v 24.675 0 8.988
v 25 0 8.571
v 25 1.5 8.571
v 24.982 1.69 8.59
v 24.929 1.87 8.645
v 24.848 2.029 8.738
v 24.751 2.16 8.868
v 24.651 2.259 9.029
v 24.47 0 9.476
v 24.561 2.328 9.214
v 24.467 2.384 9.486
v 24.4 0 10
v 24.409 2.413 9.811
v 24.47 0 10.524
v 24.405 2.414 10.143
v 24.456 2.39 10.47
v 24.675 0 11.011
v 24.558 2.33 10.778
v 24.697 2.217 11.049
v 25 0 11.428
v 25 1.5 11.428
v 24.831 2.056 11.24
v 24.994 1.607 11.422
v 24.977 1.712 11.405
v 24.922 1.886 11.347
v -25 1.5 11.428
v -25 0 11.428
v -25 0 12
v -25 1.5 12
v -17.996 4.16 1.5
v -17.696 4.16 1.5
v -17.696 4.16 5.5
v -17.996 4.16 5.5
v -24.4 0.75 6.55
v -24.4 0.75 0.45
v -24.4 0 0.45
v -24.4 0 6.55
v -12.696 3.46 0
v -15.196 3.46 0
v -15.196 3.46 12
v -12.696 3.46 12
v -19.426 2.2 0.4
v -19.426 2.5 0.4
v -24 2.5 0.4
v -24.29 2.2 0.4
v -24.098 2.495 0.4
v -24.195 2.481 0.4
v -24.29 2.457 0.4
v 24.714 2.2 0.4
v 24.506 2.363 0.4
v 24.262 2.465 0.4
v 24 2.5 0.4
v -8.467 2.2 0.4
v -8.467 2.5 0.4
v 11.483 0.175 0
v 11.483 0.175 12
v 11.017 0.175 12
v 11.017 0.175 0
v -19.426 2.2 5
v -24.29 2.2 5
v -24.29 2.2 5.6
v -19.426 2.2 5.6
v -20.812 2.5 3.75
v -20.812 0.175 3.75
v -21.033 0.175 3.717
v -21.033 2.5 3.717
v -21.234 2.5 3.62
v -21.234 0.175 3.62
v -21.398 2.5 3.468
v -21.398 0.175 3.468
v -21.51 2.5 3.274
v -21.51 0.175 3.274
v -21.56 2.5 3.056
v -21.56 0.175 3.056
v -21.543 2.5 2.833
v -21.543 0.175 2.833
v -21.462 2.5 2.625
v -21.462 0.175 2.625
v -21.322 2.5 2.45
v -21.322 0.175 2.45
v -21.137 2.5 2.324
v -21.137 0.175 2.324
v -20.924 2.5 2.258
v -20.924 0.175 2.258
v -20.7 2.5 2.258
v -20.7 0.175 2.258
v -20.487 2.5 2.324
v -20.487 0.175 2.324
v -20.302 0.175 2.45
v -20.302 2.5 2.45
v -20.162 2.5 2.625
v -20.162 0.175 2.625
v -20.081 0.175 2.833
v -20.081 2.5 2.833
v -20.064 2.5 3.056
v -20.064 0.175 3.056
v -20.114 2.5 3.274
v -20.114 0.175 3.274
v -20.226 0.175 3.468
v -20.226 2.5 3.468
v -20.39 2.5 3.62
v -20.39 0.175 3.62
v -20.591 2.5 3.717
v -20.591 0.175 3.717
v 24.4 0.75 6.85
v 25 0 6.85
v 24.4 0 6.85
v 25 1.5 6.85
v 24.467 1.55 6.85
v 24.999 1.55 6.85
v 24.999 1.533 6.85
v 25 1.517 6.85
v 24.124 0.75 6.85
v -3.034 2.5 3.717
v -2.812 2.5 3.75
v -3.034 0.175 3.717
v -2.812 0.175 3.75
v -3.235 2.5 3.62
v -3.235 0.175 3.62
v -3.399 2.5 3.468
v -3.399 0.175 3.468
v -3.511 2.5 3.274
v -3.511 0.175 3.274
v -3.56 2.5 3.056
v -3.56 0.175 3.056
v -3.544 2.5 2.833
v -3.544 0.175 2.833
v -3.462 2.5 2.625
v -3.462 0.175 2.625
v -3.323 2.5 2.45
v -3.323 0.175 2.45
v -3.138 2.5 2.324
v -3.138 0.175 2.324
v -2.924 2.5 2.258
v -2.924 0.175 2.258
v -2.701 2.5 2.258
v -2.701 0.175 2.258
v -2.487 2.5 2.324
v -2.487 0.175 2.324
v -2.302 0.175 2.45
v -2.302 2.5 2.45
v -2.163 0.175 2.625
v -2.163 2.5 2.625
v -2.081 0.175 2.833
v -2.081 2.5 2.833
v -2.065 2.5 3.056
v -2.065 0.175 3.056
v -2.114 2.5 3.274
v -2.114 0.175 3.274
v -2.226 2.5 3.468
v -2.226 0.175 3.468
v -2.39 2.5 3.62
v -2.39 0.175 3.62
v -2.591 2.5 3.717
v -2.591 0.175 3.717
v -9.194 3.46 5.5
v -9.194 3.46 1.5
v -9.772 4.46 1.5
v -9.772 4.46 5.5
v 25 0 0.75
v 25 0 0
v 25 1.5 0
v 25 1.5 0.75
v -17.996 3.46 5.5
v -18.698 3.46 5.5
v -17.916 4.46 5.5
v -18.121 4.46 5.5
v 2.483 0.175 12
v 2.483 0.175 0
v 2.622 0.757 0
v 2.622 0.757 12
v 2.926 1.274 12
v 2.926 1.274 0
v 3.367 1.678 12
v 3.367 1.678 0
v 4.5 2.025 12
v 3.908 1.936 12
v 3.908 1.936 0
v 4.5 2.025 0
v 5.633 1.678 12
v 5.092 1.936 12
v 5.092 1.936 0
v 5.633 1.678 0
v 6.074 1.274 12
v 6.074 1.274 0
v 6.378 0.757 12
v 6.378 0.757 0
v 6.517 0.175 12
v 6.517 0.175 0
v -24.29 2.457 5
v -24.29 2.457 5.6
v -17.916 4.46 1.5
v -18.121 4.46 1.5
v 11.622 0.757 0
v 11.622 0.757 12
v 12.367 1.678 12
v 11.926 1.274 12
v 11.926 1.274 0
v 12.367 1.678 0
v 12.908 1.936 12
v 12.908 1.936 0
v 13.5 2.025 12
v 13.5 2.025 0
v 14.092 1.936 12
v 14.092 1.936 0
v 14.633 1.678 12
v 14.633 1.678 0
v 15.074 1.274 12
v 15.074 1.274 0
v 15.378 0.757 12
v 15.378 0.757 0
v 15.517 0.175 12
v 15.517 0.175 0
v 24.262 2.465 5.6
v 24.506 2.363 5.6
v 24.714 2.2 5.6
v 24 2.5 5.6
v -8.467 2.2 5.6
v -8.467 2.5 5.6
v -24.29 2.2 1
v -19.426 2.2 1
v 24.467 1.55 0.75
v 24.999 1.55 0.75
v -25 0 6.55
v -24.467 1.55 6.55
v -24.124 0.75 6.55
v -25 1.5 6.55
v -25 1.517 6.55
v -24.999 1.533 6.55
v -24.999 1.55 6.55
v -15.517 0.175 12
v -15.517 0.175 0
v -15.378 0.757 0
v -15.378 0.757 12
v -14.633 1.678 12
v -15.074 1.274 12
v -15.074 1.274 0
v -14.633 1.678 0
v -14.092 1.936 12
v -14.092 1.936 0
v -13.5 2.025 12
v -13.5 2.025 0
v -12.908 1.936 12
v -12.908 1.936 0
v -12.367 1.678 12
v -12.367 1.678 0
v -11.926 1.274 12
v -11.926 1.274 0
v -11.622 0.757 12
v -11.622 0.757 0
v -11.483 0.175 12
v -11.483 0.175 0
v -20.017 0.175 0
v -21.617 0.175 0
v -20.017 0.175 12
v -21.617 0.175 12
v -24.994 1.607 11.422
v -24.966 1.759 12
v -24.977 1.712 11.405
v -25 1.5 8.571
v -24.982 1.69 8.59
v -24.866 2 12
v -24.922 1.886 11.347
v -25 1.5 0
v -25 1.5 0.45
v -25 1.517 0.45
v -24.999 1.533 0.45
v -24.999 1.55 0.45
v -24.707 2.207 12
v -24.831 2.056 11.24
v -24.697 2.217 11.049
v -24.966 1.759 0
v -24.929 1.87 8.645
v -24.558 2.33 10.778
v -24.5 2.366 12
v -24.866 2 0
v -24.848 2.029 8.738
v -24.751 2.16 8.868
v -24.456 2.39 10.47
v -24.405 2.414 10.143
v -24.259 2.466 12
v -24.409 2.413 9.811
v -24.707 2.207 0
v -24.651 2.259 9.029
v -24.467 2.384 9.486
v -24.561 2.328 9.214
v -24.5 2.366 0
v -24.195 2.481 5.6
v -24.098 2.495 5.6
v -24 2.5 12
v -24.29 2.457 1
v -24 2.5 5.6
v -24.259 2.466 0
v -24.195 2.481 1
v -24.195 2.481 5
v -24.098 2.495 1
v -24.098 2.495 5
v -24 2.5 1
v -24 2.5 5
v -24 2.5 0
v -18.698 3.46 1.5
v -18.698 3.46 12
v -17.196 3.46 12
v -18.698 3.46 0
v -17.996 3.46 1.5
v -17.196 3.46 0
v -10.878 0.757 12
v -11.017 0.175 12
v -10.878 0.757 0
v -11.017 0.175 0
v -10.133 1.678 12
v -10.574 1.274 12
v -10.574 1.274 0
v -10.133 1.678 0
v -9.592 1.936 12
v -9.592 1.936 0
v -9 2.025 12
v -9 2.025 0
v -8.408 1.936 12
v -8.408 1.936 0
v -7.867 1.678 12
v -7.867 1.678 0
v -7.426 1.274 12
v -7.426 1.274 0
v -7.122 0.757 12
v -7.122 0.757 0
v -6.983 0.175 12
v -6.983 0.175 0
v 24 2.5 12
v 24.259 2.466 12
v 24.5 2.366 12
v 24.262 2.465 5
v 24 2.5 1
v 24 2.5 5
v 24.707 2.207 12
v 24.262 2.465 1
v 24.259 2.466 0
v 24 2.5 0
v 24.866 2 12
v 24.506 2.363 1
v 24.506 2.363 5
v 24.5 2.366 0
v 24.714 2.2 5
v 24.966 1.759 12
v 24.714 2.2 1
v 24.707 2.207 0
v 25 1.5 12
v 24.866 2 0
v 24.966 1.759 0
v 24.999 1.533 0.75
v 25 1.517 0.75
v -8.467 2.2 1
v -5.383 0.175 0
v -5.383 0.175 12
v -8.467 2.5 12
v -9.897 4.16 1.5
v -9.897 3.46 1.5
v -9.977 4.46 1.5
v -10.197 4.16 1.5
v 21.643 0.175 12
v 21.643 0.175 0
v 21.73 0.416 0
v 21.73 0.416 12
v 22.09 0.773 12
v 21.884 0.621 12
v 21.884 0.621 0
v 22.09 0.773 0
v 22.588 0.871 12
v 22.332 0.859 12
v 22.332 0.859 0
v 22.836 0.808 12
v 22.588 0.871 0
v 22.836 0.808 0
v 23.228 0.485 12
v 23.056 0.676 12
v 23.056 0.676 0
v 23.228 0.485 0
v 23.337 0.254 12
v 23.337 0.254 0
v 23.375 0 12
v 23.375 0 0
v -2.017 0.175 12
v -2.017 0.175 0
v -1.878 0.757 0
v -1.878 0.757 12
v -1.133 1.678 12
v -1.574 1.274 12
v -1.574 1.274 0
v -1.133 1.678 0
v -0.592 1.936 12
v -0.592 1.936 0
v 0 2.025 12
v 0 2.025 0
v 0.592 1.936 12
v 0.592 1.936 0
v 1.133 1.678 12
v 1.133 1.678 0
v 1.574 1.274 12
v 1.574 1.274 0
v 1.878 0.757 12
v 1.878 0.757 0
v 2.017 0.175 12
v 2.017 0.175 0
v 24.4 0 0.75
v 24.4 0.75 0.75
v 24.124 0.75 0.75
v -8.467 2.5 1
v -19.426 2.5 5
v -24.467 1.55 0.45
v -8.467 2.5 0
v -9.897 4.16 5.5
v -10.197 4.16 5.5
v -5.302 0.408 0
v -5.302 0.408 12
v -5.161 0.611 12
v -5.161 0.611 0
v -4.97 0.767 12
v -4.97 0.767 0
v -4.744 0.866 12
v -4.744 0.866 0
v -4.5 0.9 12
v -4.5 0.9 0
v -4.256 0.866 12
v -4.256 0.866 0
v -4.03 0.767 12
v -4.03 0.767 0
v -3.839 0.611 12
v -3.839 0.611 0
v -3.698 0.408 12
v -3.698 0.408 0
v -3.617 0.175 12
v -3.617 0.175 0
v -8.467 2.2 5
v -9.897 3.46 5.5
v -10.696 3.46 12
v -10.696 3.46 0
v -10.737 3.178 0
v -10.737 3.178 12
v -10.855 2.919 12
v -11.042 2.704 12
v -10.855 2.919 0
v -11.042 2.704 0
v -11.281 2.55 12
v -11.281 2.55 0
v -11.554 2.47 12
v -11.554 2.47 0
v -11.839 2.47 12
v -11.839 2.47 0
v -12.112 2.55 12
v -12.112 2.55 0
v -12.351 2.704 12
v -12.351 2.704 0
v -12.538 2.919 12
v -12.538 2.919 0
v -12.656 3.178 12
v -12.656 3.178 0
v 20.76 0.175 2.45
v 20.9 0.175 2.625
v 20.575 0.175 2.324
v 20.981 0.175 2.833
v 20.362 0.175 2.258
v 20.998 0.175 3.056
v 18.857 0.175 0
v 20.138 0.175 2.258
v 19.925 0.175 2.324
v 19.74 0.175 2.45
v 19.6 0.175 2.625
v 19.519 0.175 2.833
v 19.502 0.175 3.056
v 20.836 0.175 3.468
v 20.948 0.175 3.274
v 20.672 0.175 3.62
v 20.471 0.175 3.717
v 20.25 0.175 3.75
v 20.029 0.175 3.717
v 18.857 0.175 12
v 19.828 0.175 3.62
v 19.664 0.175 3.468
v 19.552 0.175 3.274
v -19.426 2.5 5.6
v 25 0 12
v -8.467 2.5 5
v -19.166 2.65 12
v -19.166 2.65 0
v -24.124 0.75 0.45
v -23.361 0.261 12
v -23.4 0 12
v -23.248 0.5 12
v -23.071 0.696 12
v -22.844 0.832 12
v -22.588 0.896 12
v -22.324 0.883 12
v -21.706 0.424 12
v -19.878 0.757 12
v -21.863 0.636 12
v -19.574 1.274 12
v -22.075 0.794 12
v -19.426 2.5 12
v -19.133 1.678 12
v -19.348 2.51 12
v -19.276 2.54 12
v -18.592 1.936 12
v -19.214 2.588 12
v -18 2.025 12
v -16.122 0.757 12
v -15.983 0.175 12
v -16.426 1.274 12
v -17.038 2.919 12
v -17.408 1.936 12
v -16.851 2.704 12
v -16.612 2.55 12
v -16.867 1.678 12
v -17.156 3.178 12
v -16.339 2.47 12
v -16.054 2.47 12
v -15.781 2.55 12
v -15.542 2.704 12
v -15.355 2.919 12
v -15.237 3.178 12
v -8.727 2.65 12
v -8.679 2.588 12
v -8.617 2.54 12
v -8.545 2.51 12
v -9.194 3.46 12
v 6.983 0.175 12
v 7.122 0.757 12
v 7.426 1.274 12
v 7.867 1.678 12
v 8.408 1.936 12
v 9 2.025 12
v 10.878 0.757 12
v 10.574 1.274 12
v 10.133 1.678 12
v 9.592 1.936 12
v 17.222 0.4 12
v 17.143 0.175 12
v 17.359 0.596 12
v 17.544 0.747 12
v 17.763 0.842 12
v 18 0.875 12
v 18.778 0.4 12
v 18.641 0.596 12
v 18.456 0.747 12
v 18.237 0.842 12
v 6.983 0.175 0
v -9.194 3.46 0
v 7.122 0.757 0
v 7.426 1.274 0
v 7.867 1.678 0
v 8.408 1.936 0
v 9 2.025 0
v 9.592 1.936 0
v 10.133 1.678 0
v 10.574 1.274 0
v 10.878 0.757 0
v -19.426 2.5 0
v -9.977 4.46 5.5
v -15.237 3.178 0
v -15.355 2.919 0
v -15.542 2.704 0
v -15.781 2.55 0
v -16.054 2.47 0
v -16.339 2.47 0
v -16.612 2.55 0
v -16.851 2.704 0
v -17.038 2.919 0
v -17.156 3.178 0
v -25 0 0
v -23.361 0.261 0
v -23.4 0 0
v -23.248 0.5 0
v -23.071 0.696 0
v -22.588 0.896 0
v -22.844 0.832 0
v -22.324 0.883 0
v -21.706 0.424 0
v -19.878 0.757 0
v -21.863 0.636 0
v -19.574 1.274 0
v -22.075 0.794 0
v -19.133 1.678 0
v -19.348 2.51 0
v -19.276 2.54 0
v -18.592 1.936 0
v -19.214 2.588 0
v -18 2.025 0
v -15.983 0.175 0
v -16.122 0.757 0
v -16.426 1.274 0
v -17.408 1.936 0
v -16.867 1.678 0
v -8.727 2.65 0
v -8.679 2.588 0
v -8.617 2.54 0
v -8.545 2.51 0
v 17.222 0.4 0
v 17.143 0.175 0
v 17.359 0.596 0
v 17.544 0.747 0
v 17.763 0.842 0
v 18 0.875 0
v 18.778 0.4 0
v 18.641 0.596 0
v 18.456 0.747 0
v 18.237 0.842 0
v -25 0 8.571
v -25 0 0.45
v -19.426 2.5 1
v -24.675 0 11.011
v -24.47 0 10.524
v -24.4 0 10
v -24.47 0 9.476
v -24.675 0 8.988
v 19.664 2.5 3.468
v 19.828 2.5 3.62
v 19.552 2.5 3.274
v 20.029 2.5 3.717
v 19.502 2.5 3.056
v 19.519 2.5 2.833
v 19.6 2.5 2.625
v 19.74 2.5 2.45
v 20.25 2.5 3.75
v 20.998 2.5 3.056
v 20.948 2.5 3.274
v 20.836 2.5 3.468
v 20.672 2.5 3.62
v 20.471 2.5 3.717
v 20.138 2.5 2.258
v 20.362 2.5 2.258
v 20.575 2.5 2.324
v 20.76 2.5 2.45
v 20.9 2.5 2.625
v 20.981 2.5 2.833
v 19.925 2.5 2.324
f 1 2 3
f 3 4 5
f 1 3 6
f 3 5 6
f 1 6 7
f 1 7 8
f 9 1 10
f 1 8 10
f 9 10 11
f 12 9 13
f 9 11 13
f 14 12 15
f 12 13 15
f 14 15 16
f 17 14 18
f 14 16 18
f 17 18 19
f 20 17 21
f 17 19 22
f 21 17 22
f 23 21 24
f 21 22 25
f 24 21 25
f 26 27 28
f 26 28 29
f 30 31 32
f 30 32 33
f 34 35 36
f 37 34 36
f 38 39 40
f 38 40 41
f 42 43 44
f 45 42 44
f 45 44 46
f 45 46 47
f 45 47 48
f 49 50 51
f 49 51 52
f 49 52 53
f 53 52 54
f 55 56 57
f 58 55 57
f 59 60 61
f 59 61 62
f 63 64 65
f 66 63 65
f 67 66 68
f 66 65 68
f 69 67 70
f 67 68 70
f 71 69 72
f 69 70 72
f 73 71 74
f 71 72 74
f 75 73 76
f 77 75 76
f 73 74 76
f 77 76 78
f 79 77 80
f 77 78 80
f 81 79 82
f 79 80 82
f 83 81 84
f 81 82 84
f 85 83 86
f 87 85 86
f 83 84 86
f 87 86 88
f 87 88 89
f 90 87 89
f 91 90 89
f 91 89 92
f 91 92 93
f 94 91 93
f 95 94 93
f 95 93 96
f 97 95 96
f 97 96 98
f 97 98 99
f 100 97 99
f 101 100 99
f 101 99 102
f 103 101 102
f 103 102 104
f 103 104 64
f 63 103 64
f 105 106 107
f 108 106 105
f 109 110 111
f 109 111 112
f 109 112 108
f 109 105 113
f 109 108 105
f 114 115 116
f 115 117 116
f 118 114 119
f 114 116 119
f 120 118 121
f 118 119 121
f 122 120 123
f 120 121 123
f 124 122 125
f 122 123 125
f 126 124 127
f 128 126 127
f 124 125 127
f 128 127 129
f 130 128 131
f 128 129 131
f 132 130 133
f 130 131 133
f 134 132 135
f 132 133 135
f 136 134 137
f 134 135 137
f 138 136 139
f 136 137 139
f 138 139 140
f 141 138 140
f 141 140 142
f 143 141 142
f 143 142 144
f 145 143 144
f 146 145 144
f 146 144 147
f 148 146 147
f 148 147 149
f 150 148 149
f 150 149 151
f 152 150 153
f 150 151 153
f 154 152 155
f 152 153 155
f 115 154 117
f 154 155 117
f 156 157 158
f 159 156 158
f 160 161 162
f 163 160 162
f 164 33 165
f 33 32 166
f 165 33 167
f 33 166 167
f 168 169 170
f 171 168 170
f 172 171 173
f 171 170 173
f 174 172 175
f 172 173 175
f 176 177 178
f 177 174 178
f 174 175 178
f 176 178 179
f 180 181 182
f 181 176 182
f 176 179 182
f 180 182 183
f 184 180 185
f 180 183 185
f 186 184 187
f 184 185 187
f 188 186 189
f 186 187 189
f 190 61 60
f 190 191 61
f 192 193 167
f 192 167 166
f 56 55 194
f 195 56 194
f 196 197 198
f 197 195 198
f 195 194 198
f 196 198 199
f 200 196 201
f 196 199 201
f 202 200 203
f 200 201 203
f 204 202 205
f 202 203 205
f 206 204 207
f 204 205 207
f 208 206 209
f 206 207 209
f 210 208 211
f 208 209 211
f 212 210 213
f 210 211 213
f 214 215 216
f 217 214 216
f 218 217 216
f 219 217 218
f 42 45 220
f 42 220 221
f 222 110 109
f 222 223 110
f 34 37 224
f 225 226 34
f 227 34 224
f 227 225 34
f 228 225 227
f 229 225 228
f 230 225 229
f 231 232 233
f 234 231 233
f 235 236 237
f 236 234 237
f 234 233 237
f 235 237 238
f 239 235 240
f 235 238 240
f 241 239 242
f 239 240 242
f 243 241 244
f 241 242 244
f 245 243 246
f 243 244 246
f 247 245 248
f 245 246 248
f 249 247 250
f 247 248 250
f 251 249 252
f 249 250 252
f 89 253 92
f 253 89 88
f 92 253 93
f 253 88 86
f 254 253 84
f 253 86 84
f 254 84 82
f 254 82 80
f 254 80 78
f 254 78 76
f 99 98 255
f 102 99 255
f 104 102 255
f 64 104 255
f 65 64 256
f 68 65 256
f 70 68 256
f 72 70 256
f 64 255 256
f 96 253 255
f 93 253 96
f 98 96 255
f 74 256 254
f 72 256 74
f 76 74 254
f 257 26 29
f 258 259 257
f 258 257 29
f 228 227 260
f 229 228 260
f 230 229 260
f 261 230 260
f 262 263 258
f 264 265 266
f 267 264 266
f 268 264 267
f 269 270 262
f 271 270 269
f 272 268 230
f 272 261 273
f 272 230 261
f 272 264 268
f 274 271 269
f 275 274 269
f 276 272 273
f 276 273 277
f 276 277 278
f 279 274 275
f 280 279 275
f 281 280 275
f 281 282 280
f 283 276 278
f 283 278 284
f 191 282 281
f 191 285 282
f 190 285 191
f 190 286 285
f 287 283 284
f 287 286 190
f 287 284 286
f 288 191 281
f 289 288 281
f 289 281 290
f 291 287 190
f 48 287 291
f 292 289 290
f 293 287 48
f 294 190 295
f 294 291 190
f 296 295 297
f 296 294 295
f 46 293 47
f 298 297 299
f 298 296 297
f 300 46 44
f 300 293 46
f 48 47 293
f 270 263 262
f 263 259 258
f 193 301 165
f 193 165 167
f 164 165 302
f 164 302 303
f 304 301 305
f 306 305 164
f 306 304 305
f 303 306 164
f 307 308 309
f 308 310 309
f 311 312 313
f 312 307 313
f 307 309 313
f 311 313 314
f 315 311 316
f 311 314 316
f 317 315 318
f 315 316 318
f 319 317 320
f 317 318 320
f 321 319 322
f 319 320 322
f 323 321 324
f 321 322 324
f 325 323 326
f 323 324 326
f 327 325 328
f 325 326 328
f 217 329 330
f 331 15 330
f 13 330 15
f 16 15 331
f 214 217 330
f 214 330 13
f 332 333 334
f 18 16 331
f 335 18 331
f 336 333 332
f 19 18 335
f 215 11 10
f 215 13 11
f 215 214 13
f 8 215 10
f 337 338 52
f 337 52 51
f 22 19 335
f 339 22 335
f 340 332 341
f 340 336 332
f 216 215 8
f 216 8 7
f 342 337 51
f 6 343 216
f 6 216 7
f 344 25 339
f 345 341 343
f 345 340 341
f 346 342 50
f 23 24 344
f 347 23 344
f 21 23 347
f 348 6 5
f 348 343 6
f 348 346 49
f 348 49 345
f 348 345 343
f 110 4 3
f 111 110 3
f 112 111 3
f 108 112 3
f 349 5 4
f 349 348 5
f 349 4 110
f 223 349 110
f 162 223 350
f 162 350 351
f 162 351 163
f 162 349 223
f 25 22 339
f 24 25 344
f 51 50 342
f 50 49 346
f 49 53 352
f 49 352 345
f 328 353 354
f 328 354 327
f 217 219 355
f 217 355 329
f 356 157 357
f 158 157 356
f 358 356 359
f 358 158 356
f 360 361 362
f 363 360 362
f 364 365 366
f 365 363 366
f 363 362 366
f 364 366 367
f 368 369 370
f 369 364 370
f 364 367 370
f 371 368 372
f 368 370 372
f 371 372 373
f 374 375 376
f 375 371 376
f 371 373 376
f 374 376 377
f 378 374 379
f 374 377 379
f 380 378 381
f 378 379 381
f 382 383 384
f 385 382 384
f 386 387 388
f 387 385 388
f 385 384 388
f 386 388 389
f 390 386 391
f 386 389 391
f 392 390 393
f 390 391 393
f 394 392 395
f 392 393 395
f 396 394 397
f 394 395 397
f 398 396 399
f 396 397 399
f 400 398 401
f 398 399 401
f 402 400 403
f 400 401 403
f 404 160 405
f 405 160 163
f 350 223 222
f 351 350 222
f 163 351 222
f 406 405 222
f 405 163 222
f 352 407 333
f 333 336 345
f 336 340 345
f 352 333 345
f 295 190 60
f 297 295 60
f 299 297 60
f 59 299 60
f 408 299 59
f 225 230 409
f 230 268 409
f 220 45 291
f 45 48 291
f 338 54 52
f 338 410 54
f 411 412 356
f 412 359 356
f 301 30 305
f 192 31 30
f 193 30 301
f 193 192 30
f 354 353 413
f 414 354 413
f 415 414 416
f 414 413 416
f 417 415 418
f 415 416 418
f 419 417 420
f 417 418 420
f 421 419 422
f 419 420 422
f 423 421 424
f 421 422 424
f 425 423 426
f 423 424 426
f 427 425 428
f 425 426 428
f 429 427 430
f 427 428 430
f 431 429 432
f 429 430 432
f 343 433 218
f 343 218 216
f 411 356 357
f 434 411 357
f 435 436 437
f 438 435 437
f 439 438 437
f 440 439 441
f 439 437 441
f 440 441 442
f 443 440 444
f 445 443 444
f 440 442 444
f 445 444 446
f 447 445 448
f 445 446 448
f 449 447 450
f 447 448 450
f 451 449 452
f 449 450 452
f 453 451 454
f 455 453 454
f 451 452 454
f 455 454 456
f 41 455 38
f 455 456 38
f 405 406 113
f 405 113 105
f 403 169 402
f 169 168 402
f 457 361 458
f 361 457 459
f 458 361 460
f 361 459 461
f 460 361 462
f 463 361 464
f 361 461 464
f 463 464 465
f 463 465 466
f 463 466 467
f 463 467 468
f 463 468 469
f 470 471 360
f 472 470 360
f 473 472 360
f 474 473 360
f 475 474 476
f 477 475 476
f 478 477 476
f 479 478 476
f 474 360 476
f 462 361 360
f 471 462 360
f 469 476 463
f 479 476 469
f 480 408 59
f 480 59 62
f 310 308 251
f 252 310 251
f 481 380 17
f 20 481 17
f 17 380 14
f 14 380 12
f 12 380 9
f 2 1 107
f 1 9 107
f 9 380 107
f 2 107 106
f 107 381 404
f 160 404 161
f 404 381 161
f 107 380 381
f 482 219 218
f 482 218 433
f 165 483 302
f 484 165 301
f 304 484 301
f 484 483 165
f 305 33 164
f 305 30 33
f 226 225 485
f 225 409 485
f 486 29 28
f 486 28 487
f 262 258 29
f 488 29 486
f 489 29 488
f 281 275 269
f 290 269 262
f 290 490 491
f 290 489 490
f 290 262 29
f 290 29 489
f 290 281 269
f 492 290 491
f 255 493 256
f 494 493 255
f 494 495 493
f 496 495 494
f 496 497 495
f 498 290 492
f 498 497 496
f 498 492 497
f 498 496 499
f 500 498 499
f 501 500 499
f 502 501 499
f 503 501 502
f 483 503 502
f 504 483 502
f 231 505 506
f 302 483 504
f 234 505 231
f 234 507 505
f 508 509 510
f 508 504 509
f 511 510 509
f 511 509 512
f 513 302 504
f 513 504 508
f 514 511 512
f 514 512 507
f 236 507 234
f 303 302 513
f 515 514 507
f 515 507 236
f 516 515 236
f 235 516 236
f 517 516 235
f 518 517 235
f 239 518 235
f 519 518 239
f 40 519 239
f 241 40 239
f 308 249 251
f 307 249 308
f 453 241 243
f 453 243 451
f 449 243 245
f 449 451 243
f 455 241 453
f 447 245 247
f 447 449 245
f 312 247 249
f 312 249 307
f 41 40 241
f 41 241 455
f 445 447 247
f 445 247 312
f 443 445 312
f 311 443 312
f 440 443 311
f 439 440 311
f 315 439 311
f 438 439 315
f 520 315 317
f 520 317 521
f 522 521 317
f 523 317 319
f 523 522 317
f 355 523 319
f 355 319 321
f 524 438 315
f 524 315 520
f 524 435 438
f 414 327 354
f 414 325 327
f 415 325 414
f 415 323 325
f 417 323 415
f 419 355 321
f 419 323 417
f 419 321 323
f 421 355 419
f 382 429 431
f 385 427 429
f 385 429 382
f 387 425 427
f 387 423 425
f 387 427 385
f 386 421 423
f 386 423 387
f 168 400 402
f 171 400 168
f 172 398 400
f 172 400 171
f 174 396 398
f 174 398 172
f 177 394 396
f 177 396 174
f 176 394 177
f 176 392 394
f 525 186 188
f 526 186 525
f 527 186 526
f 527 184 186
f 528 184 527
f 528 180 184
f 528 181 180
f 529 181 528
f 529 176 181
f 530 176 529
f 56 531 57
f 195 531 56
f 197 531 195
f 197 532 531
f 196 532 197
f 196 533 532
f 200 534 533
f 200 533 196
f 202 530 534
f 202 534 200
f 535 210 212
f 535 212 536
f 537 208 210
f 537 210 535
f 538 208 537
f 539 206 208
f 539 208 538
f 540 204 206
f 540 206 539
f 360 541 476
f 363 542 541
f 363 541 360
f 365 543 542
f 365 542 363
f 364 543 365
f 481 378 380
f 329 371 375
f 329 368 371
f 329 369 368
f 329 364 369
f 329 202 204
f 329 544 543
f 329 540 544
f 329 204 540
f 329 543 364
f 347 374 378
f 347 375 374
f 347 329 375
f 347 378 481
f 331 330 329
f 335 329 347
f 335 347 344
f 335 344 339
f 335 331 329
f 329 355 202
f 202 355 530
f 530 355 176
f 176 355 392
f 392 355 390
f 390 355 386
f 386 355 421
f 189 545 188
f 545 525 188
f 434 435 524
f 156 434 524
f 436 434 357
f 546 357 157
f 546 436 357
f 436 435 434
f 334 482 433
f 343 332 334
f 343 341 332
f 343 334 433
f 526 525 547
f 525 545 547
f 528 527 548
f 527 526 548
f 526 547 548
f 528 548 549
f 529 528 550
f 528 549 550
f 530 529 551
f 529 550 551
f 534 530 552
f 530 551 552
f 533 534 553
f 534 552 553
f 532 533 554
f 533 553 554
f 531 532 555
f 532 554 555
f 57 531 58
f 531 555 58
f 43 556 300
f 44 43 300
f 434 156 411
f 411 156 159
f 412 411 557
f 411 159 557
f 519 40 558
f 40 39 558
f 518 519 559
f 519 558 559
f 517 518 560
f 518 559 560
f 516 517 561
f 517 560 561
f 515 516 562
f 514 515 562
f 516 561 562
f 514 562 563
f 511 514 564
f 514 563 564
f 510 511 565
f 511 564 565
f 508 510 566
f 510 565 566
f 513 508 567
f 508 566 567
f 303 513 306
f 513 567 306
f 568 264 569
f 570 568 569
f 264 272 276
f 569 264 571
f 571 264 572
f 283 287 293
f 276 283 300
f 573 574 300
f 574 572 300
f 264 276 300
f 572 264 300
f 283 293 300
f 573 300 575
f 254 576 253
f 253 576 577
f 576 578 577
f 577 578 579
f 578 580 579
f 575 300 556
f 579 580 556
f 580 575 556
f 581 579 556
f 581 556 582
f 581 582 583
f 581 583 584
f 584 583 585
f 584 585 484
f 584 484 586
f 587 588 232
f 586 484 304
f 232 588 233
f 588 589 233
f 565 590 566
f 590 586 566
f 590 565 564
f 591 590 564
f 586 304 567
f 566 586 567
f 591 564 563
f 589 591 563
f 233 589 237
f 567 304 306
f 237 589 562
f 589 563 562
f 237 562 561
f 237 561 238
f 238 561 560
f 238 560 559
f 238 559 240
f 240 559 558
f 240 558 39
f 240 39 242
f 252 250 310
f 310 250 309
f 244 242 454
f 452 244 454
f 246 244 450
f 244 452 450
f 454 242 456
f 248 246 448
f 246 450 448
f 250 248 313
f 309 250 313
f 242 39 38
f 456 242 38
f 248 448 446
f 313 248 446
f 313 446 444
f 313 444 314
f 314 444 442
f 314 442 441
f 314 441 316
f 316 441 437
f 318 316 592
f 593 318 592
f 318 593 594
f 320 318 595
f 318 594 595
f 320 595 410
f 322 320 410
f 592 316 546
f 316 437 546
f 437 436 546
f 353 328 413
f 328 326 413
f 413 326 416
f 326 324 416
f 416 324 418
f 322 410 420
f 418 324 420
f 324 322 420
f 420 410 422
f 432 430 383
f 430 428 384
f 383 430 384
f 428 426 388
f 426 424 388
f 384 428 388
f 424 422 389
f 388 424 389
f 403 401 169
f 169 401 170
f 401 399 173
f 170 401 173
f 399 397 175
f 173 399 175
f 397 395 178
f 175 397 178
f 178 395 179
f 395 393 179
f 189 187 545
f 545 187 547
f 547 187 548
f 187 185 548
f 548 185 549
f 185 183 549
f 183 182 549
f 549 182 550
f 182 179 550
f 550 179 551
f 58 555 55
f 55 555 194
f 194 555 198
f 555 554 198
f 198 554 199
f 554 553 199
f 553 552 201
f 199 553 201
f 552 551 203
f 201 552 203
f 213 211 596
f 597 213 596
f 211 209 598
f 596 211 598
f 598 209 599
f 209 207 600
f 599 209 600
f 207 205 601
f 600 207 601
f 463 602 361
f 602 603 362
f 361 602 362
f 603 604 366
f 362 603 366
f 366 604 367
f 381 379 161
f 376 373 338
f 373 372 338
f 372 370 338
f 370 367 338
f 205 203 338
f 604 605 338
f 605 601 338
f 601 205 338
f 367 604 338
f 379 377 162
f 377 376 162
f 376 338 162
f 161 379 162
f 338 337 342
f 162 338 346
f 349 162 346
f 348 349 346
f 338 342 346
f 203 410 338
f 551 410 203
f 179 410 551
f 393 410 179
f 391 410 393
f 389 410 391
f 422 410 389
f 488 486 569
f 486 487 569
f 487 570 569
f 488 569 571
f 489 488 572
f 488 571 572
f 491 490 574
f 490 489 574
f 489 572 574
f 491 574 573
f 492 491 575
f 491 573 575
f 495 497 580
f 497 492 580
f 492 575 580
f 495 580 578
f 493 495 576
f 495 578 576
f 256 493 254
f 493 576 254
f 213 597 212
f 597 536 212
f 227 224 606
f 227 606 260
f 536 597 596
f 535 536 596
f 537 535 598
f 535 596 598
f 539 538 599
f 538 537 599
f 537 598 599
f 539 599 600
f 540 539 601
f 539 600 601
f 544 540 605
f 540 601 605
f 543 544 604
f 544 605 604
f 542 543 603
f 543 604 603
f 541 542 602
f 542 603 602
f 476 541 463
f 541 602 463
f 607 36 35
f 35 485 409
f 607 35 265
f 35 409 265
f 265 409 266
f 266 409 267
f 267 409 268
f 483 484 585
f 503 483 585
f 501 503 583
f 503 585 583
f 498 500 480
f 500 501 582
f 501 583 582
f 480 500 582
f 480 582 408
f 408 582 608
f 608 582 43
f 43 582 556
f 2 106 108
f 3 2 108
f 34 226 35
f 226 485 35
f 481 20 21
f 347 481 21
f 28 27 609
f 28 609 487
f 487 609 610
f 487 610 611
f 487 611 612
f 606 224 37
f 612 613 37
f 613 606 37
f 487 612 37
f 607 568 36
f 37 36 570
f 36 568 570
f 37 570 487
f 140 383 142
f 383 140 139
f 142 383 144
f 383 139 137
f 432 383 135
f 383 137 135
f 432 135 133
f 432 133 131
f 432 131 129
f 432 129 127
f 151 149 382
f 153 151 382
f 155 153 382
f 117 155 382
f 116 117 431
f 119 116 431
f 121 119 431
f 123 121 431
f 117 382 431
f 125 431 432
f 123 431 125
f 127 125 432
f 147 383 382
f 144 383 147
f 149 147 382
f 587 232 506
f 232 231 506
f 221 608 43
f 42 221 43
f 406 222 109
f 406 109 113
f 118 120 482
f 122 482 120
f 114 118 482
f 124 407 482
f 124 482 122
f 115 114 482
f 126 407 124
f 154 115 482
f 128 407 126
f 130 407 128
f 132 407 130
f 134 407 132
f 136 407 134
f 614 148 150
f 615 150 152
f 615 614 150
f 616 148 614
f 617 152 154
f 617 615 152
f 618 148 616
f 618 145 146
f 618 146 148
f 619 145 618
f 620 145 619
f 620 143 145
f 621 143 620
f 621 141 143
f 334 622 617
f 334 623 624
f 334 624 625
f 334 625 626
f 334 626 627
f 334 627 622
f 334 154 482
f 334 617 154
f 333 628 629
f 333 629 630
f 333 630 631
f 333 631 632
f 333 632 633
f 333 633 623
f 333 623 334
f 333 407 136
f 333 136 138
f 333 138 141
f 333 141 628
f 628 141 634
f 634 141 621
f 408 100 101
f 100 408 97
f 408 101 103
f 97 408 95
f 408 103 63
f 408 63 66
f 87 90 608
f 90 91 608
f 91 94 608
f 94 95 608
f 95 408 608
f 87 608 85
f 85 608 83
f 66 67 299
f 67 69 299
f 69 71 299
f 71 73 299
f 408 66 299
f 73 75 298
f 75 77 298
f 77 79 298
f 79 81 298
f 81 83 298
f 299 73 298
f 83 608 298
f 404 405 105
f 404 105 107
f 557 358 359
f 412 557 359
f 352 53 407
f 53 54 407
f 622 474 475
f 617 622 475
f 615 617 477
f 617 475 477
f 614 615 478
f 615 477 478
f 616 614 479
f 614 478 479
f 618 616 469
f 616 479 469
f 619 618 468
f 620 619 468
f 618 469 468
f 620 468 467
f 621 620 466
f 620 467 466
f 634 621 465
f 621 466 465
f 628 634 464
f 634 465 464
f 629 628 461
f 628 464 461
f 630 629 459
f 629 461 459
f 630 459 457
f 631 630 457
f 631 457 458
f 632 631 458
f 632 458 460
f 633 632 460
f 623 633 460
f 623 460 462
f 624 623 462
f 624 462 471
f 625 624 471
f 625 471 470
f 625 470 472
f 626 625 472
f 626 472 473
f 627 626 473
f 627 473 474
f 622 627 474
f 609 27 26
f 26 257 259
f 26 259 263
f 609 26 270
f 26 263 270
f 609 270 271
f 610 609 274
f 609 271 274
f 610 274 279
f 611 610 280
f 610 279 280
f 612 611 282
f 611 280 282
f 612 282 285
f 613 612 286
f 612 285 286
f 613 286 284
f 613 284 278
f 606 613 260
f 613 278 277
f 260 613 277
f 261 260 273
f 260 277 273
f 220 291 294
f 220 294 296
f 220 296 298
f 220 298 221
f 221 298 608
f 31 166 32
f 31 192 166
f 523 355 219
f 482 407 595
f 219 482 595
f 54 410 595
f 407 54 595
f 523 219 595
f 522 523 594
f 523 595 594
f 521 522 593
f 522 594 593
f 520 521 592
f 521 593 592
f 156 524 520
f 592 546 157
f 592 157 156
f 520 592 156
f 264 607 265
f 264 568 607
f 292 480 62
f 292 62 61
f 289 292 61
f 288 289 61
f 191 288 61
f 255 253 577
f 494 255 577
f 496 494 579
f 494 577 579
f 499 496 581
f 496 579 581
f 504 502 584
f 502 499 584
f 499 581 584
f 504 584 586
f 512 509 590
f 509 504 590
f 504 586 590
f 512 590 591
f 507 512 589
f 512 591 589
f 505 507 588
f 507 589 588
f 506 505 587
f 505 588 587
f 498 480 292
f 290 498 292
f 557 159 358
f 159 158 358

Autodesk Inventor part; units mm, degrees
sketch "Sketch1" plane through (0, 0, 0) normal (0, 0, 1) x (1, 0, 0)
  arc A0 (-21.6, 0) -> (-23.4, 0) centre (-22.5, 0) ccw
  arc A1 (-15.975, 0) -> (-20.025, 0) centre (-18, 0) ccw
  arc A2 (-11.475, 0) -> (-15.525, 0) centre (-13.5, 0) ccw
  arc A3 (-6.975, 0) -> (-11.025, 0) centre (-9, 0) ccw
  arc A4 (-3.6, 0) -> (-5.4, 0) centre (-4.5, 0) ccw
  arc A5 (2.025, 0) -> (-2.025, 0) centre (0, 0) ccw
  arc A6 (6.525, 0) -> (2.475, 0) centre (4.5, 0) ccw
  arc A7 (11.025, 0) -> (6.975, 0) centre (9, 0) ccw
  arc A8 (15.525, 0) -> (11.475, 0) centre (13.5, 0) ccw
  arc A9 (18.875, 0) -> (17.125, 0) centre (18, 0) ccw
  arc A10 (23.375, 0) -> (21.625, 0) centre (22.5, 0) ccw
  line L0 (-25, 0) -> (-25, 1.5)
  line L1 (-25, 0) -> (25, 0)
  line L2 (25, 0) -> (25, 1.5)
  arc A11 (25, 1.5) -> (24, 2.5) centre (24, 1.5) ccw
  arc A12 (-24, 2.5) -> (-25, 1.5) centre (-24, 1.5) ccw
  line L3 (-8.467, 2.5) -> (24, 2.5)
  line L4 (-19.1661, 2.65) -> (-18.6985, 3.46)
  line L5 (-18.6985, 3.46) -> (-9.1945, 3.46)
  line L6 (-9.1945, 3.46) -> (-8.7268, 2.65)
  line L7 (-9.1945, 3.46) -> (-8.2592, 3.46) construction
  arc A13 (-8.7268, 2.65) -> (-8.467, 2.5) centre (-8.467, 2.8) ccw
  line L8 (-19.4259, 2.5) -> (-24, 2.5)
  arc A14 (-19.4259, 2.5) -> (-19.1661, 2.65) centre (-19.4259, 2.8) ccw
  line L9 (0, 0) -> (0, 12.7088) construction
  point P0 (-19.2527, 2.5)
  point P1 (-8.6402, 2.5)
  dimension "d1" = 1.8
  dimension "d2" = 4.5
  dimension "d3" = 4.5
  dimension "d4" = 4.5
  dimension "d5" = 4.5
  dimension "d6" = 4.5
  dimension "d7" = 4.5
  dimension "d8" = 4.5
  dimension "d9" = 4.5
  dimension "d10" = 4.5
  dimension "d11" = 4.5
  dimension "d12" = 4.05
  dimension "d13" = 4.05
  dimension "d14" = 4.05
  dimension "d15" = 1.8
  dimension "d16" = 4.05
  dimension "d17" = 4.05
  dimension "d18" = 4.05
  dimension "d19" = 4.05
  dimension "d20" = 1.75
  dimension "d21" = 1.75
  dimension "d22" = 2.5
  dimension "d23" = 50
  dimension "d24" = 1.5
  dimension "d25" = 1.5
  dimension "d26" = 1
  dimension "d27" = 1
  dimension "d29" = 120
  dimension "d32" = 9.504
  dimension "d33" = 60
  dimension "d67" = 0.96
  dimension "d68" = 0.3
  dimension "d69" = 0.3
  dimension "d70" = 33.467
  dimension "d71" = 5.5741
extrude "Extrusion1" add sketch "Sketch1" along normal blind 12 contours A0 L1 L0 A12 L8 A14 L4 L5 L6 A13 L3 A11 L2 A10 A9 A8 A7 A6 A5 A4 A3 A2 A1
sketch "Sketch2" plane through (0, 0, 12) normal (0, 0, 1) x (1, 0, 0)
  line L0 (-9.1945, 3.46) -> (-18.6985, 3.46) projected
  point P0 (0, 0)
  point P1 (-16.1965, 3.46)
  point P2 (-11.6965, 3.46)
  dimension "d39" = 4.5
  dimension "d40" = 2.502
hole "Hole1" at (-16.1965, 3.46, 12) at (-11.6965, 3.46, 12) direction (0, 0, -1) diameter 2 end through all
sketch "Sketch3" plane through (24, 2.5, 12) normal (0, 1, 0) x (1, 0, 0)
  line L0 (0.714, 6.4) -> (-32.467, 6.4)
  line L1 (-32.467, 6.4) -> (-32.467, 7)
  line L2 (-32.467, 7) -> (0.714, 7)
  line L3 (0.714, 7) -> (0.714, 6.4)
  line L4 (-32.467, 11) -> (0.714, 11)
  line L5 (0.714, 11) -> (0.714, 11.6)
  line L6 (0.714, 11.6) -> (-32.467, 11.6)
  line L7 (-32.467, 11.6) -> (-32.467, 11)
  line L8 (1, 12) -> (1, 0) projected
  line L9 (0, 12) -> (-32.467, 12) projected
  line L10 (-43.4259, 6.4) -> (-48.29, 6.4)
  line L11 (-48.29, 6.4) -> (-48.29, 7)
  line L12 (-48.29, 7) -> (-43.4259, 7)
  line L13 (-43.4259, 7) -> (-43.4259, 6.4)
  line L14 (-43.4259, 11.6) -> (-48.29, 11.6)
  line L15 (-48.29, 11.6) -> (-48.29, 11)
  line L16 (-48.29, 11) -> (-43.4259, 11)
  line L17 (-43.4259, 11) -> (-43.4259, 11.6)
  line L18 (-49, 12) -> (-49, 0) projected
  point P0 (-24, 12)
  point P1 (-32.5535, 12.5)
  point P2 (-32.467, 12)
  point P3 (-43.4259, 12)
  dimension "d48" = 0.286
  dimension "d49" = 0.286
  dimension "d50" = 0.6
  dimension "d51" = 0.6
  dimension "d57" = 0.4
  dimension "d58" = 4
  dimension "d79" = 0.71
extrude "Extrusion2" cut sketch "Sketch3" against normal blind 0.3
ref_plane "Work Plane1" through (-2.9282, 3.7996, 12.5) normal (0, 1, 0) x (1, 0, 0)
sketch "Sketch4" plane through (-2.9282, 2.5, 12.5) normal (0, 1, 0) x (1, 0, 0)
  line L0 (27.9282, 12.5495) -> (27.9282, 3.2148)
  line L1 (26.9282, 11.5) -> (-5.5388, 11.5) projected
  line L2 (27.9282, 12.5) -> (27.9282, 0.5) projected
  line L3 (-22.0718, 12.5) -> (-22.0718, 0.5) projected
  point P0 (2.9282, 12.5)
  point P1 (-17.8838, 9.5)
  point P2 (0.1157, 9.5)
  point P3 (23.1782, 9.5)
  dimension "d54" = 4.75
  dimension "d72" = 2
  dimension "d121" = 4.188
  dimension "d122" = 23.0625
hole "Hole2" at (-20.812, 2.5, 3) at (-2.8125, 2.5, 3) at (20.25, 2.5, 3) direction (0, -1, 0) diameter 1.5 end through all both
sketch "Sketch5" plane through (-8.467, 2.5, 12) normal (0, 1, 0) x (1, 0, 0)
  circle A0 centre (34.867, 2.0003) radius 2
  line L0 (32.467, 0) -> (33.467, 0) projected
  line L1 (33.467, 12) -> (33.467, 0) projected
  line L2 (33.467, 0) -> (33.467, 0.572)
  point P0 (8.467, 12)
  dimension "d73" = 4
  dimension "d75" = 1.4
  dimension "d76" = 0.572
extrude "Extrusion3" cut sketch "Sketch5" against normal blind 7.05
mirror "Mirror1" about plane through (0, 0, 0) normal (1, 0, 0) of "Extrusion3"
ref_plane "Work Plane2" through (0, 0, 1.5) normal (0, 0, -1) x (-1, 0, 0)
sketch "Sketch6" plane through (0, 0, 1.5) normal (0, 0, -1) x (-1, 0, 0)
  line L0 (8.7268, 2.65) -> (9.1945, 3.46) projected
  line L1 (9.1945, 3.46) -> (9.7718, 4.46)
  line L2 (9.1945, 3.46) -> (10.6965, 3.46) projected
  line L3 (9.7718, 4.46) -> (9.9768, 4.46)
  line L4 (9.9768, 4.46) -> (10.1968, 4.16)
  line L5 (10.1968, 4.16) -> (9.8968, 4.16)
  line L6 (9.8968, 4.16) -> (9.8968, 3.46)
  line L7 (9.1945, 3.46) -> (10.6965, 3.46) projected
  line L8 (9.8968, 3.46) -> (9.1945, 3.46)
  line L9 (12.6965, 3.46) -> (15.1965, 3.46) projected
  line L10 (13.9465, 3.46) -> (13.9465, 5.3261) construction
  line L11 (17.1965, 3.46) -> (18.6985, 3.46) projected
  line L12 (18.6985, 3.46) -> (18.1211, 4.46)
  line L13 (18.6985, 3.46) -> (19.8532, 3.46) construction
  line L14 (18.1211, 4.46) -> (17.9161, 4.46)
  line L15 (17.9161, 4.46) -> (17.6961, 4.16)
  line L16 (17.6961, 4.16) -> (17.9961, 4.16)
  line L17 (17.9961, 4.16) -> (17.9961, 3.46)
  line L18 (17.9961, 3.46) -> (18.6985, 3.46)
  point P0 (0, 0)
  dimension "d81" = 1
  dimension "d82" = 0.205
  dimension "d83" = 126.25
  dimension "d84" = 0.3
  dimension "d85" = 0.3
  dimension "d94" = 120
  dimension "d95" = 1
  dimension "d96" = 0.205
  dimension "d97" = 53.75
  dimension "d98" = 53.75
  dimension "d99" = 0.3
  dimension "d100" = 0.3
extrude "Extrusion4" add sketch "Sketch6" against normal blind 4
ref_plane "Work Plane4" through (0, 0, 0.45) normal (0, 0, -1) x (-1, 0, 0)
sketch "Sketch7" plane through (0, 0, 0.45) normal (0, 0, -1) x (-1, 0, 0)
  line L0 (24.9987, 1.55) -> (24.4667, 1.55)
  line L1 (25, 0) -> (20.025, 0) projected
  arc A0 (15.1965, 3.46) -> (17.1965, 3.46) centre (16.1965, 3.46) ccw projected
  line L2 (12.6965, 3.46) -> (15.1965, 3.46) projected
  arc A1 (10.6965, 3.46) -> (12.6965, 3.46) centre (11.6965, 3.46) ccw projected
  line L3 (9.1945, 3.46) -> (10.6965, 3.46) projected
  line L4 (8.7268, 2.65) -> (9.1945, 3.46) projected
  arc A2 (8.467, 2.5) -> (8.7268, 2.65) centre (8.467, 2.8) ccw projected
  line L5 (-24, 2.5) -> (8.467, 2.5) projected
  arc A3 (-24, 2.5) -> (-25, 1.5) centre (-24, 1.5) ccw projected
  line L6 (-25, 0) -> (-25, 1.5) projected
  line L7 (-23.375, 0) -> (-25, 0) projected
  arc A4 (-21.625, 0) -> (-23.375, 0) centre (-22.5, 0) ccw projected
  line L8 (-18.875, 0) -> (-21.625, 0) projected
  arc A5 (-17.125, 0) -> (-18.875, 0) centre (-18, 0) ccw projected
  line L9 (-15.525, 0) -> (-17.125, 0) projected
  arc A6 (-11.475, 0) -> (-15.525, 0) centre (-13.5, 0) ccw projected
  line L10 (-11.025, 0) -> (-11.475, 0) projected
  arc A7 (-6.975, 0) -> (-11.025, 0) centre (-9, 0) ccw projected
  line L11 (-6.525, 0) -> (-6.975, 0) projected
  arc A8 (-2.475, 0) -> (-6.525, 0) centre (-4.5, 0) ccw projected
  line L12 (-2.025, 0) -> (-2.475, 0) projected
  arc A9 (2.025, 0) -> (-2.025, 0) centre (0, 0) ccw projected
  line L13 (3.6, 0) -> (2.025, 0) projected
  arc A10 (5.4, 0) -> (3.6, 0) centre (4.5, 0) ccw projected
  line L14 (6.975, 0) -> (5.4, 0) projected
  arc A11 (11.025, 0) -> (6.975, 0) centre (9, 0) ccw projected
  line L15 (11.475, 0) -> (11.025, 0) projected
  arc A12 (15.525, 0) -> (11.475, 0) centre (13.5, 0) ccw projected
  line L16 (15.975, 0) -> (15.525, 0) projected
  arc A13 (20.025, 0) -> (15.975, 0) centre (18, 0) ccw projected
  line L17 (25, 0) -> (23.4, 0) projected
  line L18 (25, 1.5) -> (25, 0) projected
  arc A14 (25, 1.5) -> (24, 2.5) centre (24, 1.5) ccw projected
  line L19 (19.4259, 2.5) -> (24, 2.5) projected
  arc A15 (19.1661, 2.65) -> (19.4259, 2.5) centre (19.4259, 2.8) ccw projected
  line L20 (18.6985, 3.46) -> (19.1661, 2.65) projected
  line L21 (17.1965, 3.46) -> (18.6985, 3.46) projected
  line L22 (24.4667, 1.55) -> (24.124, 0.7504)
  line L23 (24.4667, 1.55) -> (25.3367, 1.55) construction
  line L24 (24.124, 0.7504) -> (24.4, 0.7504)
  line L25 (24.4, 0.7504) -> (24.4, 0)
  line L26 (24.4, 0) -> (25, 0)
  arc A16 (25, 1.5) -> (24, 2.5) centre (24, 1.5) ccw projected
  line L27 (25, 0) -> (25, 1.5)
  line L28 (21.6, 0) -> (20.025, 0) projected
  arc A17 (23.4, 0) -> (21.6, 0) centre (22.5, 0) ccw projected
  point P0 (0, 0)
  dimension "d102" = 1.55
  dimension "d103" = 0.532
  dimension "d104" = 113.2
  dimension "d105" = 0.87
  dimension "d106" = 0.276
extrude "Extrusion5" cut sketch "Sketch7" against normal blind 6.1 contours A14 L18 L1 L25 L24 L22 L0
sketch "Sketch8" plane through (0, 0, 12) normal (0, 0, 1) x (1, 0, 0)
  line L0 (-22, 0) -> (23, 0)
  line L1 (23, 0) -> (23, 0.175)
  line L2 (23, 0.175) -> (-22, 0.175)
  line L3 (-22, 0.175) -> (-22, 0)
  line L4 (25, 0) -> (25, 1.5) projected
  point P0 (0, 0)
  point P1 (21.625, 0)
  dimension "d109" = 0.175
  dimension "d110" = 45
  dimension "d111" = 2
extrude "Extrusion6" cut sketch "Sketch8" against normal through all
ref_plane "Work Plane5" through (0, 0, 0.75) normal (0, 0, -1) x (-1, 0, 0)
sketch "Sketch9" plane through (0, 0, 0.75) normal (0, 0, -1) x (-1, 0, 0)
  line L0 (24.9987, 1.55) -> (24.4667, 1.55)
  line L1 (25, 0) -> (24.25, 0)
  line L2 (25, 1.5) -> (25, 0)
  line L3 (24.4667, 1.55) -> (24.124, 0.7504)
  line L4 (24.4667, 1.55) -> (25.3367, 1.55) construction
  line L5 (24.124, 0.7504) -> (24.4, 0.7504)
  line L6 (24.4, 0.7504) -> (24.4, 0)
  line L7 (24.4, 0) -> (25, 0)
  line L8 (25, 0) -> (25, 1.5)
  line L9 (0, 0) -> (0, 5.6827) construction
  line L10 (-24.9987, 1.55) -> (-24.4667, 1.55)
  line L11 (-24.4, 0.7504) -> (-24.4, 0)
  line L12 (-25, 0.7504) -> (-25, 0)
  line L13 (-24.4, 0) -> (-25, 0)
  line L14 (-25, 0) -> (-25, 1.5)
  line L15 (-24.4667, 1.55) -> (-25.3367, 1.55) construction
  line L16 (-25, 0) -> (-24.25, 0)
  line L17 (-24.124, 0.7504) -> (-24.4, 0.7504)
  line L18 (-24.4667, 1.55) -> (-24.124, 0.7504)
  arc A0 (-24, 2.5) -> (-25, 1.5) centre (-24, 1.5) ccw projected
  arc A1 (-24.9987, 1.55) -> (-25, 1.5) centre (-24, 1.5) ccw
  point P0 (24.25, 0)
  point P1 (24, 1.5)
  point P2 (24, 1.5)
  point P3 (-24.25, 0)
  point P4 (-24, 1.5)
  point P5 (-24, 1.5)
  dimension "d115" = 0.532
  dimension "d116" = 113.2
  dimension "d117" = 0.87
  dimension "d118" = 0.276
extrude "Extrusion7" cut sketch "Sketch9" against normal blind 6.1
properties part number "3d_LM - Pinza 2" material "PA12 SLS 3D Print"
